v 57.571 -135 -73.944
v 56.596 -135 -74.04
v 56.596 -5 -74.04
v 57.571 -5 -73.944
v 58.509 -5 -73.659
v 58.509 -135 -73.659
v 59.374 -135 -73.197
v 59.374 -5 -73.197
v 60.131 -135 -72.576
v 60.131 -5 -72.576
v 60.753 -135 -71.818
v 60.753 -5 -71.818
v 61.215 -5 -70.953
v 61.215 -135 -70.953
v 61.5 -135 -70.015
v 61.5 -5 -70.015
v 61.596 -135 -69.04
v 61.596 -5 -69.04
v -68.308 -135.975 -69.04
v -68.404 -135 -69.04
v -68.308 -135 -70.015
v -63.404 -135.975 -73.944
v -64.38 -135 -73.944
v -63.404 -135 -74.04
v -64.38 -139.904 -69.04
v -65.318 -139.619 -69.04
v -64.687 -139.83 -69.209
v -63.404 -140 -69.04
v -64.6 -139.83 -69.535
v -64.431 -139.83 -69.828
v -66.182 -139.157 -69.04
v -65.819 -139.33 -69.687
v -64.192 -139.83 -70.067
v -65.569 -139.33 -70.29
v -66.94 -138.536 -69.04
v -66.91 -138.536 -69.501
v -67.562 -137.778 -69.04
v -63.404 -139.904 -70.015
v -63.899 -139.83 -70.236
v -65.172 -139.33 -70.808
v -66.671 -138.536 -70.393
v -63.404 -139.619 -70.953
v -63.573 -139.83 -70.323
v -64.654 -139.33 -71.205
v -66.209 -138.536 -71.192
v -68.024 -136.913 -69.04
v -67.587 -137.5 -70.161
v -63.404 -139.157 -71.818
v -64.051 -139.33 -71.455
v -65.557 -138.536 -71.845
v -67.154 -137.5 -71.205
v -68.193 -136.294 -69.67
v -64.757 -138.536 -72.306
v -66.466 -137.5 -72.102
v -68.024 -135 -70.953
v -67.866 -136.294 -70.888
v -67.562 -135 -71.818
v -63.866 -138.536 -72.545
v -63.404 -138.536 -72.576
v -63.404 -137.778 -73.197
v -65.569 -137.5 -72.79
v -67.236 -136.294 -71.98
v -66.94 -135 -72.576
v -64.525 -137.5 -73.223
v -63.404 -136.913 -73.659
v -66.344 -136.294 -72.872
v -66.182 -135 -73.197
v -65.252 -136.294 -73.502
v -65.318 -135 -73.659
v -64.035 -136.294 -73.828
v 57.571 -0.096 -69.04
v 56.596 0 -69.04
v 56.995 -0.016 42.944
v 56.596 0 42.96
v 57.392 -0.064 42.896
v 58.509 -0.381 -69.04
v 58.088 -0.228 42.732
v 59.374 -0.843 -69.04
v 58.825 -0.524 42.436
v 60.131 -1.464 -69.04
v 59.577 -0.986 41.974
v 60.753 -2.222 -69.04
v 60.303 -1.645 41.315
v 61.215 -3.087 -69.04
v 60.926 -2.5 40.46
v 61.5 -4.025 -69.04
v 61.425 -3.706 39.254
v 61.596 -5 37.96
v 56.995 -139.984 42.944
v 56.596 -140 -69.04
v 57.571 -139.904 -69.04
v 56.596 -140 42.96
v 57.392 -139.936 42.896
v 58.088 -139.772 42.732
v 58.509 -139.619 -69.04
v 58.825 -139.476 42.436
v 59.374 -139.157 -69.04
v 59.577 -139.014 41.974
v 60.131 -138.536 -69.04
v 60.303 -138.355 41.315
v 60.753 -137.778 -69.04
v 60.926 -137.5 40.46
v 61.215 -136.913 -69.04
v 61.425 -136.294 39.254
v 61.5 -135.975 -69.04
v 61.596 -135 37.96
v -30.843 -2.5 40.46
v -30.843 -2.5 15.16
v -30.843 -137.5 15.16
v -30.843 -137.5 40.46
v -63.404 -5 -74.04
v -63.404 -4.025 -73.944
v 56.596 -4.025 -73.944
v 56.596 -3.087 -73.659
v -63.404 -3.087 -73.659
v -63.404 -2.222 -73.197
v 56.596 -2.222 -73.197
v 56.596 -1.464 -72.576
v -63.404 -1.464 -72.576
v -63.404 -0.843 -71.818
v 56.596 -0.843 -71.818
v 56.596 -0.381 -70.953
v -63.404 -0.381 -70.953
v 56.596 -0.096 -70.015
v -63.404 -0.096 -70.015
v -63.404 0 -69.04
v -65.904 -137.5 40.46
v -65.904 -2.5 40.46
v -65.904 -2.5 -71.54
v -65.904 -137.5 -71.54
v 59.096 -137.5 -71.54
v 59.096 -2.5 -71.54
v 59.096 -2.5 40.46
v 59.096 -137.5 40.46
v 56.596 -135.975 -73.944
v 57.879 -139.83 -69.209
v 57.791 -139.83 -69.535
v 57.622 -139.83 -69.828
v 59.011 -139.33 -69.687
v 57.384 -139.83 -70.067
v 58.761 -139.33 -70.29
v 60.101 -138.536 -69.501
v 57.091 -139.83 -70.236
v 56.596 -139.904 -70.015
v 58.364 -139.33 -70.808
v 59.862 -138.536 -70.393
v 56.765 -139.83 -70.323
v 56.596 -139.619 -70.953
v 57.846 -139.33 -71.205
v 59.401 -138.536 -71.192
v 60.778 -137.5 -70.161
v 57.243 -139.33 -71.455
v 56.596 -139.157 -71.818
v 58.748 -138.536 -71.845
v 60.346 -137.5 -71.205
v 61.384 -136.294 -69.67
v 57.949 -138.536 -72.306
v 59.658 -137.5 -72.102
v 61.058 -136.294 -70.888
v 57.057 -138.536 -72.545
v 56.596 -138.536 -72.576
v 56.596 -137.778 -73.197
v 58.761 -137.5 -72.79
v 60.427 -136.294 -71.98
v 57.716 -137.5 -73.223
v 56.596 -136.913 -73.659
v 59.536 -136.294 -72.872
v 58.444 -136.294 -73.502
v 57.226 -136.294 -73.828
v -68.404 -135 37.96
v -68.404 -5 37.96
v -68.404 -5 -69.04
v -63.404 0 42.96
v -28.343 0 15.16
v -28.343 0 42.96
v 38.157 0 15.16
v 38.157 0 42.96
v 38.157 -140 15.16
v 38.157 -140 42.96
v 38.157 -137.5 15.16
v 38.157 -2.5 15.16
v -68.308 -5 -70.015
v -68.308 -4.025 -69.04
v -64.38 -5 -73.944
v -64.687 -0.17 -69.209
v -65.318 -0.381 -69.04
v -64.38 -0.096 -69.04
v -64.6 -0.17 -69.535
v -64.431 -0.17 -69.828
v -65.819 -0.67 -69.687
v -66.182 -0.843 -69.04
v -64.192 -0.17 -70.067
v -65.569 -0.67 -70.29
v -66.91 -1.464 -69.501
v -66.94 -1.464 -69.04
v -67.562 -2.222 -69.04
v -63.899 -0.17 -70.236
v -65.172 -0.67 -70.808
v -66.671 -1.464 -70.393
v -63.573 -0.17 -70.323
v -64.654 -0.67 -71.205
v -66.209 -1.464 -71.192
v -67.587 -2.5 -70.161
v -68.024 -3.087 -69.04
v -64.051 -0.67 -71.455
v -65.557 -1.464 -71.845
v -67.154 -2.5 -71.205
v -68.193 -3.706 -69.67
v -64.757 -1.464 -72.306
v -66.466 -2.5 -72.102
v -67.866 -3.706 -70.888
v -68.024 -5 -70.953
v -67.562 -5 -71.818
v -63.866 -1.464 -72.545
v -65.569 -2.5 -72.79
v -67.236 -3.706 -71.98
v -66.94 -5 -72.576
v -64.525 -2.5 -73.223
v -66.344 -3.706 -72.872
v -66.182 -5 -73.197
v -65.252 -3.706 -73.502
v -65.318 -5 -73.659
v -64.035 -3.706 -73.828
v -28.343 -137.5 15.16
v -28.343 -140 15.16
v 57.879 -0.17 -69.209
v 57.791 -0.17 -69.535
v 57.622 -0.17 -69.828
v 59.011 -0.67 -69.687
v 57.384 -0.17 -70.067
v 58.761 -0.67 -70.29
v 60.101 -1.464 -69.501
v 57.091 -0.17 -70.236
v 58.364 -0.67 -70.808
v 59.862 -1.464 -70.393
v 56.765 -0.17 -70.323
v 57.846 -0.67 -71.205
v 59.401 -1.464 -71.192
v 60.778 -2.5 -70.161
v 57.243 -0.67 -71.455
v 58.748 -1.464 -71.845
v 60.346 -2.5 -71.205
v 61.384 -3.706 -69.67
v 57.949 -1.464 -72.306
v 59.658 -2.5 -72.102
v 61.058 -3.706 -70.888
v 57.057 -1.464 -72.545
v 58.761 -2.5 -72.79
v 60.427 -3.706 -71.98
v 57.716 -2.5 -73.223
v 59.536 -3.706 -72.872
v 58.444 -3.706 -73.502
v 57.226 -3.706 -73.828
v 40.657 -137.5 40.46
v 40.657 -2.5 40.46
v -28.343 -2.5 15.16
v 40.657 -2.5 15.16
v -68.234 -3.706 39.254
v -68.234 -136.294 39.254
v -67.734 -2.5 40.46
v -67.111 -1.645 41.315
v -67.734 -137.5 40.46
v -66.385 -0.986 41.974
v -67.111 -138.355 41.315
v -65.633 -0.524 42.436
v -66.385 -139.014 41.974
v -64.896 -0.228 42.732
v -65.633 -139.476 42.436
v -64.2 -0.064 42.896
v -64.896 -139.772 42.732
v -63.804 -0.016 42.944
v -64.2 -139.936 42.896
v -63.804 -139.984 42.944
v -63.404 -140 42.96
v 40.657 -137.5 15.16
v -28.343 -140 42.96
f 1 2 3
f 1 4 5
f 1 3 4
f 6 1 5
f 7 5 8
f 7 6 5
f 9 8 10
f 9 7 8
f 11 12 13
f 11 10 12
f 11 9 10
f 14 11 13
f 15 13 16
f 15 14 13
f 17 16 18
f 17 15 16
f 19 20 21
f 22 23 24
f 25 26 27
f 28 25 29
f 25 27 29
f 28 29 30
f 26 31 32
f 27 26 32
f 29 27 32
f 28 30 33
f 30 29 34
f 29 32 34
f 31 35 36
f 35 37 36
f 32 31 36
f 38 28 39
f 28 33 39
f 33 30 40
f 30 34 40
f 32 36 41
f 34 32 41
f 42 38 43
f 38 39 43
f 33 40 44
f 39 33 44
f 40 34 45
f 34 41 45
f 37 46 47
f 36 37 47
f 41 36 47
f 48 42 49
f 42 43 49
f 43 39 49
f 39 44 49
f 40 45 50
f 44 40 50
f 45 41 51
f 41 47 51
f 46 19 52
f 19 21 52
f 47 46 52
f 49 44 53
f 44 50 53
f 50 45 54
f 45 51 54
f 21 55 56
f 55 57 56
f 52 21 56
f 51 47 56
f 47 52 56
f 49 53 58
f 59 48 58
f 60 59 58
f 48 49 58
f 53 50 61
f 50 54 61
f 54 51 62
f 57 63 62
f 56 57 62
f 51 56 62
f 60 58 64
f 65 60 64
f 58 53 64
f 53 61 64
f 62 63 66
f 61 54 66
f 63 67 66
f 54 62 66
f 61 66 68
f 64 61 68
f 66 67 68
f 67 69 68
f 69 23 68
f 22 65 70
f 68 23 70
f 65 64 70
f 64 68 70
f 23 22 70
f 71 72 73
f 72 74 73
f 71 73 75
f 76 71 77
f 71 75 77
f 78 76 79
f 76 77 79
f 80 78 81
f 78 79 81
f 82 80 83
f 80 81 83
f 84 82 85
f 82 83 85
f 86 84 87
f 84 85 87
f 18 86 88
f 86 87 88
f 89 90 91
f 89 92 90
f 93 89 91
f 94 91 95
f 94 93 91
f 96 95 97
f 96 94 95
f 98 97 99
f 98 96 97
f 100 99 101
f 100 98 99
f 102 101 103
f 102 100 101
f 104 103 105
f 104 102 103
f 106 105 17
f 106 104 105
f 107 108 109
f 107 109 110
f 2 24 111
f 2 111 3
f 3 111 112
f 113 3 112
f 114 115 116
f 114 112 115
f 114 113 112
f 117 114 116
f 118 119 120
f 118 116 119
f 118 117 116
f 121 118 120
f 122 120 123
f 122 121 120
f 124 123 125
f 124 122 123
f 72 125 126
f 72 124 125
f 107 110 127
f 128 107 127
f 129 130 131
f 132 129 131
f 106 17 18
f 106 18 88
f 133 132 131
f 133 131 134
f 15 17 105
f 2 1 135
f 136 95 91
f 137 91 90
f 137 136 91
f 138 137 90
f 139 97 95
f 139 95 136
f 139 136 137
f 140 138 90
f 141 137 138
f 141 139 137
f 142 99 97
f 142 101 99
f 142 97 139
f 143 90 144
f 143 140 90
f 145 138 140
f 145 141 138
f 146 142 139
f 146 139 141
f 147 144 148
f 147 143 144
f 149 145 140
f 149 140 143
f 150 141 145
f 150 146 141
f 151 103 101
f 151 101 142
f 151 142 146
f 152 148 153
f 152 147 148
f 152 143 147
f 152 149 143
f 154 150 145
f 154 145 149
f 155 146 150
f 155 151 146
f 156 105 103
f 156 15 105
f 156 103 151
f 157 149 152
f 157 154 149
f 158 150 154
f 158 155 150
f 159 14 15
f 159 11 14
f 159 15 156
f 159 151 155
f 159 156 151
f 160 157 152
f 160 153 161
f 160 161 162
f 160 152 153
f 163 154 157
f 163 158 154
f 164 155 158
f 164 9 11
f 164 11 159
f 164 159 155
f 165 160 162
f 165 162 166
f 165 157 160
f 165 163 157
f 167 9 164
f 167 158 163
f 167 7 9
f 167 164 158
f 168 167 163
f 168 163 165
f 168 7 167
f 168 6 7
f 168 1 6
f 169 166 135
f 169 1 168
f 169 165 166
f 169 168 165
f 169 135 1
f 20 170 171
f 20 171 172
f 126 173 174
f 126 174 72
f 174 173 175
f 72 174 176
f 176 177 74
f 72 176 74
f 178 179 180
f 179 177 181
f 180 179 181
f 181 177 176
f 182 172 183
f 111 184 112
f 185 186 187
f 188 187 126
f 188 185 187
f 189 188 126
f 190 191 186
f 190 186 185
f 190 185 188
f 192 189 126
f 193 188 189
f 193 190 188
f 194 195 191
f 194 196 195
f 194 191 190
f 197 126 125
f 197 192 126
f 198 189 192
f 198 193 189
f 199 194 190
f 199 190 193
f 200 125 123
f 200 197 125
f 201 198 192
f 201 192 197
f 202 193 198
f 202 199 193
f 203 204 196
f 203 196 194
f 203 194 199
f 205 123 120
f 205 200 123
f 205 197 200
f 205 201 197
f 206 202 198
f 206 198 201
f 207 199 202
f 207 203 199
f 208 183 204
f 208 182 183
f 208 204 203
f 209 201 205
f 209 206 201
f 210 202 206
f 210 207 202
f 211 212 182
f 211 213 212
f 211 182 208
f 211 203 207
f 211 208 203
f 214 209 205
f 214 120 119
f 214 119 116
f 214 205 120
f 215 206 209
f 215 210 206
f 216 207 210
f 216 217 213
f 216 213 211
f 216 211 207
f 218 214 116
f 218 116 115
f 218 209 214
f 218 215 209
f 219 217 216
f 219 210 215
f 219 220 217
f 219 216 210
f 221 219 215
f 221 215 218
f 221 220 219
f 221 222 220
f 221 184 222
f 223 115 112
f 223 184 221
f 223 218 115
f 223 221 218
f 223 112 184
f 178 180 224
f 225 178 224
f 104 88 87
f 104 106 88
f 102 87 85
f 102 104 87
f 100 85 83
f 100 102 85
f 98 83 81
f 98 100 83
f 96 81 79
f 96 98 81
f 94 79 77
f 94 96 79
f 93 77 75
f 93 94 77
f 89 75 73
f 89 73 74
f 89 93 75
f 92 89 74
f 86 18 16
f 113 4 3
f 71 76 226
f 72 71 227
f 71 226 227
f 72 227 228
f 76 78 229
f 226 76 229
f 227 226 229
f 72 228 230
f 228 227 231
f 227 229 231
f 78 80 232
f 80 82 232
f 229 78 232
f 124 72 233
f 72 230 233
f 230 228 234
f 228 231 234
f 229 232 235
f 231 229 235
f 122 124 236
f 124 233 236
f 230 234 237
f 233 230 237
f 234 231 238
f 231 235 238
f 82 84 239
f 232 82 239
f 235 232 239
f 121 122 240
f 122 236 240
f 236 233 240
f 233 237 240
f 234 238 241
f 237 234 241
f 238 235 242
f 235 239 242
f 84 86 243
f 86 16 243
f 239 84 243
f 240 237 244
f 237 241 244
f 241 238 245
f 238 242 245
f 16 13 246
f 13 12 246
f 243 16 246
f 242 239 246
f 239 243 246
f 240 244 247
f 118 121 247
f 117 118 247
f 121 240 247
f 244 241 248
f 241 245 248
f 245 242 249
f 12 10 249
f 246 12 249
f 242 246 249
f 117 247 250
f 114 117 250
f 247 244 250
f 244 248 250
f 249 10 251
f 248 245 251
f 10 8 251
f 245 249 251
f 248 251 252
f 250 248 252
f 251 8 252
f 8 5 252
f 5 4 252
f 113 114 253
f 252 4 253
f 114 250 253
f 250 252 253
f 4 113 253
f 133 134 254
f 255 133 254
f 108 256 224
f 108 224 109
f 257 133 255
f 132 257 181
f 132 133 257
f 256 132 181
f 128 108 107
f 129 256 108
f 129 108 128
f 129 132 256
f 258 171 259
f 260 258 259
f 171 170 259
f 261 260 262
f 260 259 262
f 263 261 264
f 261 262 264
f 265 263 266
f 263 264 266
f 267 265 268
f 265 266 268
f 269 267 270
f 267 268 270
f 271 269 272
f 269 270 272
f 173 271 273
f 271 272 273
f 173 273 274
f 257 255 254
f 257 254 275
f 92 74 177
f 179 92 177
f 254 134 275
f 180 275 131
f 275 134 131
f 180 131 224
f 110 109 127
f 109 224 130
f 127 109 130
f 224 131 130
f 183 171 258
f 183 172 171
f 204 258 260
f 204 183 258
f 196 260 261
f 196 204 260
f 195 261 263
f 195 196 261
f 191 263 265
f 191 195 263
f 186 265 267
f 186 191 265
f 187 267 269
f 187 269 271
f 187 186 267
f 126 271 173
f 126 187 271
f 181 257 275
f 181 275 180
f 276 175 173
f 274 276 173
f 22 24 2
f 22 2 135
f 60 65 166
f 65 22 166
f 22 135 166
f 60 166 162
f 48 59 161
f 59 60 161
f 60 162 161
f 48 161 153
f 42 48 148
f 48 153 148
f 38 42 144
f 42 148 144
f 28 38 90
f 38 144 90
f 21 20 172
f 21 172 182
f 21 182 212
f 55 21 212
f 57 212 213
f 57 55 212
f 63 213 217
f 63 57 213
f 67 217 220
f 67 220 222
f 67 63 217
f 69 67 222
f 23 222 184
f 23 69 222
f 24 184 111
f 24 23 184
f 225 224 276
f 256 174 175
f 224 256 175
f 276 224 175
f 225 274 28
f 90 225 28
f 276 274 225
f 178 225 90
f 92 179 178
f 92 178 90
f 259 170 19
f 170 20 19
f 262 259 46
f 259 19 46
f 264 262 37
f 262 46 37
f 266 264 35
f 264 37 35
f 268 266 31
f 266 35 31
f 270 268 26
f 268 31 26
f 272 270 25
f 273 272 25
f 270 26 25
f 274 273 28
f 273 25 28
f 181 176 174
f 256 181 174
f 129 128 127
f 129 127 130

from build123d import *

# Parameters (mm, degrees)
F1_DEPTH = 140
F2_T     = -2.5
F3_R     = 5


# Not quite as in the source:
# - a shell that OpenCascade refuses in one call is made with other operations: the cavity is built on its own and cut out


with BuildPart() as f1:
    # F0 (on Front) → F1 (new body)
    with BuildSketch(Plane.XZ):
        Polygon((-68.4042458236, 42.9600325577), (-68.4042458236, -74.0399674423), (61.5957541764, -74.0399674423), (61.5957541764, 42.9600325577), (38.1572941835, 42.9600325577), (38.1572941835, 15.1600325577), (-28.3427058165, 15.1600325577), (-28.3427058165, 42.9600325577), align=None)
    extrude(amount=F1_DEPTH)

    # F2: a shell. OpenCascade refuses it in one call, so the cavity is built on its own and cut out:
    # the body offset inwards by the wall thickness, plus a prism from it out through each open face.
    f2_core = offset(f1.part, amount=F2_T, kind=Kind.INTERSECTION, mode=Mode.PRIVATE)
    f2_exits = [f2_core.faces().sort_by_distance(p)[0] for p in [
        (4.907294, -70, 12.660033),
    ]]
    add(f2_core, mode=Mode.SUBTRACT)
    extrude(f2_exits, amount=-F2_T, mode=Mode.SUBTRACT)

    # F3
    f3_edges = [f1.edges().sort_by_distance(p)[0] for p in [
        (-68.404246, -70, 42.960033),
        (-68.404246, -70, -74.039967),
        (-68.404246, 0, -15.539967),
        (-68.404246, -140, -15.539967),
        (61.595754, -70, -74.039967),
        (61.595754, -70, 42.960033),
        (61.595754, 0, -15.539967),
        (61.595754, -140, -15.539967),
        (-3.404246, 0, -74.039967),
        (-3.404246, -140, -74.039967),
    ]]
    fillet(f3_edges, radius=F3_R)


solid = f1.part
